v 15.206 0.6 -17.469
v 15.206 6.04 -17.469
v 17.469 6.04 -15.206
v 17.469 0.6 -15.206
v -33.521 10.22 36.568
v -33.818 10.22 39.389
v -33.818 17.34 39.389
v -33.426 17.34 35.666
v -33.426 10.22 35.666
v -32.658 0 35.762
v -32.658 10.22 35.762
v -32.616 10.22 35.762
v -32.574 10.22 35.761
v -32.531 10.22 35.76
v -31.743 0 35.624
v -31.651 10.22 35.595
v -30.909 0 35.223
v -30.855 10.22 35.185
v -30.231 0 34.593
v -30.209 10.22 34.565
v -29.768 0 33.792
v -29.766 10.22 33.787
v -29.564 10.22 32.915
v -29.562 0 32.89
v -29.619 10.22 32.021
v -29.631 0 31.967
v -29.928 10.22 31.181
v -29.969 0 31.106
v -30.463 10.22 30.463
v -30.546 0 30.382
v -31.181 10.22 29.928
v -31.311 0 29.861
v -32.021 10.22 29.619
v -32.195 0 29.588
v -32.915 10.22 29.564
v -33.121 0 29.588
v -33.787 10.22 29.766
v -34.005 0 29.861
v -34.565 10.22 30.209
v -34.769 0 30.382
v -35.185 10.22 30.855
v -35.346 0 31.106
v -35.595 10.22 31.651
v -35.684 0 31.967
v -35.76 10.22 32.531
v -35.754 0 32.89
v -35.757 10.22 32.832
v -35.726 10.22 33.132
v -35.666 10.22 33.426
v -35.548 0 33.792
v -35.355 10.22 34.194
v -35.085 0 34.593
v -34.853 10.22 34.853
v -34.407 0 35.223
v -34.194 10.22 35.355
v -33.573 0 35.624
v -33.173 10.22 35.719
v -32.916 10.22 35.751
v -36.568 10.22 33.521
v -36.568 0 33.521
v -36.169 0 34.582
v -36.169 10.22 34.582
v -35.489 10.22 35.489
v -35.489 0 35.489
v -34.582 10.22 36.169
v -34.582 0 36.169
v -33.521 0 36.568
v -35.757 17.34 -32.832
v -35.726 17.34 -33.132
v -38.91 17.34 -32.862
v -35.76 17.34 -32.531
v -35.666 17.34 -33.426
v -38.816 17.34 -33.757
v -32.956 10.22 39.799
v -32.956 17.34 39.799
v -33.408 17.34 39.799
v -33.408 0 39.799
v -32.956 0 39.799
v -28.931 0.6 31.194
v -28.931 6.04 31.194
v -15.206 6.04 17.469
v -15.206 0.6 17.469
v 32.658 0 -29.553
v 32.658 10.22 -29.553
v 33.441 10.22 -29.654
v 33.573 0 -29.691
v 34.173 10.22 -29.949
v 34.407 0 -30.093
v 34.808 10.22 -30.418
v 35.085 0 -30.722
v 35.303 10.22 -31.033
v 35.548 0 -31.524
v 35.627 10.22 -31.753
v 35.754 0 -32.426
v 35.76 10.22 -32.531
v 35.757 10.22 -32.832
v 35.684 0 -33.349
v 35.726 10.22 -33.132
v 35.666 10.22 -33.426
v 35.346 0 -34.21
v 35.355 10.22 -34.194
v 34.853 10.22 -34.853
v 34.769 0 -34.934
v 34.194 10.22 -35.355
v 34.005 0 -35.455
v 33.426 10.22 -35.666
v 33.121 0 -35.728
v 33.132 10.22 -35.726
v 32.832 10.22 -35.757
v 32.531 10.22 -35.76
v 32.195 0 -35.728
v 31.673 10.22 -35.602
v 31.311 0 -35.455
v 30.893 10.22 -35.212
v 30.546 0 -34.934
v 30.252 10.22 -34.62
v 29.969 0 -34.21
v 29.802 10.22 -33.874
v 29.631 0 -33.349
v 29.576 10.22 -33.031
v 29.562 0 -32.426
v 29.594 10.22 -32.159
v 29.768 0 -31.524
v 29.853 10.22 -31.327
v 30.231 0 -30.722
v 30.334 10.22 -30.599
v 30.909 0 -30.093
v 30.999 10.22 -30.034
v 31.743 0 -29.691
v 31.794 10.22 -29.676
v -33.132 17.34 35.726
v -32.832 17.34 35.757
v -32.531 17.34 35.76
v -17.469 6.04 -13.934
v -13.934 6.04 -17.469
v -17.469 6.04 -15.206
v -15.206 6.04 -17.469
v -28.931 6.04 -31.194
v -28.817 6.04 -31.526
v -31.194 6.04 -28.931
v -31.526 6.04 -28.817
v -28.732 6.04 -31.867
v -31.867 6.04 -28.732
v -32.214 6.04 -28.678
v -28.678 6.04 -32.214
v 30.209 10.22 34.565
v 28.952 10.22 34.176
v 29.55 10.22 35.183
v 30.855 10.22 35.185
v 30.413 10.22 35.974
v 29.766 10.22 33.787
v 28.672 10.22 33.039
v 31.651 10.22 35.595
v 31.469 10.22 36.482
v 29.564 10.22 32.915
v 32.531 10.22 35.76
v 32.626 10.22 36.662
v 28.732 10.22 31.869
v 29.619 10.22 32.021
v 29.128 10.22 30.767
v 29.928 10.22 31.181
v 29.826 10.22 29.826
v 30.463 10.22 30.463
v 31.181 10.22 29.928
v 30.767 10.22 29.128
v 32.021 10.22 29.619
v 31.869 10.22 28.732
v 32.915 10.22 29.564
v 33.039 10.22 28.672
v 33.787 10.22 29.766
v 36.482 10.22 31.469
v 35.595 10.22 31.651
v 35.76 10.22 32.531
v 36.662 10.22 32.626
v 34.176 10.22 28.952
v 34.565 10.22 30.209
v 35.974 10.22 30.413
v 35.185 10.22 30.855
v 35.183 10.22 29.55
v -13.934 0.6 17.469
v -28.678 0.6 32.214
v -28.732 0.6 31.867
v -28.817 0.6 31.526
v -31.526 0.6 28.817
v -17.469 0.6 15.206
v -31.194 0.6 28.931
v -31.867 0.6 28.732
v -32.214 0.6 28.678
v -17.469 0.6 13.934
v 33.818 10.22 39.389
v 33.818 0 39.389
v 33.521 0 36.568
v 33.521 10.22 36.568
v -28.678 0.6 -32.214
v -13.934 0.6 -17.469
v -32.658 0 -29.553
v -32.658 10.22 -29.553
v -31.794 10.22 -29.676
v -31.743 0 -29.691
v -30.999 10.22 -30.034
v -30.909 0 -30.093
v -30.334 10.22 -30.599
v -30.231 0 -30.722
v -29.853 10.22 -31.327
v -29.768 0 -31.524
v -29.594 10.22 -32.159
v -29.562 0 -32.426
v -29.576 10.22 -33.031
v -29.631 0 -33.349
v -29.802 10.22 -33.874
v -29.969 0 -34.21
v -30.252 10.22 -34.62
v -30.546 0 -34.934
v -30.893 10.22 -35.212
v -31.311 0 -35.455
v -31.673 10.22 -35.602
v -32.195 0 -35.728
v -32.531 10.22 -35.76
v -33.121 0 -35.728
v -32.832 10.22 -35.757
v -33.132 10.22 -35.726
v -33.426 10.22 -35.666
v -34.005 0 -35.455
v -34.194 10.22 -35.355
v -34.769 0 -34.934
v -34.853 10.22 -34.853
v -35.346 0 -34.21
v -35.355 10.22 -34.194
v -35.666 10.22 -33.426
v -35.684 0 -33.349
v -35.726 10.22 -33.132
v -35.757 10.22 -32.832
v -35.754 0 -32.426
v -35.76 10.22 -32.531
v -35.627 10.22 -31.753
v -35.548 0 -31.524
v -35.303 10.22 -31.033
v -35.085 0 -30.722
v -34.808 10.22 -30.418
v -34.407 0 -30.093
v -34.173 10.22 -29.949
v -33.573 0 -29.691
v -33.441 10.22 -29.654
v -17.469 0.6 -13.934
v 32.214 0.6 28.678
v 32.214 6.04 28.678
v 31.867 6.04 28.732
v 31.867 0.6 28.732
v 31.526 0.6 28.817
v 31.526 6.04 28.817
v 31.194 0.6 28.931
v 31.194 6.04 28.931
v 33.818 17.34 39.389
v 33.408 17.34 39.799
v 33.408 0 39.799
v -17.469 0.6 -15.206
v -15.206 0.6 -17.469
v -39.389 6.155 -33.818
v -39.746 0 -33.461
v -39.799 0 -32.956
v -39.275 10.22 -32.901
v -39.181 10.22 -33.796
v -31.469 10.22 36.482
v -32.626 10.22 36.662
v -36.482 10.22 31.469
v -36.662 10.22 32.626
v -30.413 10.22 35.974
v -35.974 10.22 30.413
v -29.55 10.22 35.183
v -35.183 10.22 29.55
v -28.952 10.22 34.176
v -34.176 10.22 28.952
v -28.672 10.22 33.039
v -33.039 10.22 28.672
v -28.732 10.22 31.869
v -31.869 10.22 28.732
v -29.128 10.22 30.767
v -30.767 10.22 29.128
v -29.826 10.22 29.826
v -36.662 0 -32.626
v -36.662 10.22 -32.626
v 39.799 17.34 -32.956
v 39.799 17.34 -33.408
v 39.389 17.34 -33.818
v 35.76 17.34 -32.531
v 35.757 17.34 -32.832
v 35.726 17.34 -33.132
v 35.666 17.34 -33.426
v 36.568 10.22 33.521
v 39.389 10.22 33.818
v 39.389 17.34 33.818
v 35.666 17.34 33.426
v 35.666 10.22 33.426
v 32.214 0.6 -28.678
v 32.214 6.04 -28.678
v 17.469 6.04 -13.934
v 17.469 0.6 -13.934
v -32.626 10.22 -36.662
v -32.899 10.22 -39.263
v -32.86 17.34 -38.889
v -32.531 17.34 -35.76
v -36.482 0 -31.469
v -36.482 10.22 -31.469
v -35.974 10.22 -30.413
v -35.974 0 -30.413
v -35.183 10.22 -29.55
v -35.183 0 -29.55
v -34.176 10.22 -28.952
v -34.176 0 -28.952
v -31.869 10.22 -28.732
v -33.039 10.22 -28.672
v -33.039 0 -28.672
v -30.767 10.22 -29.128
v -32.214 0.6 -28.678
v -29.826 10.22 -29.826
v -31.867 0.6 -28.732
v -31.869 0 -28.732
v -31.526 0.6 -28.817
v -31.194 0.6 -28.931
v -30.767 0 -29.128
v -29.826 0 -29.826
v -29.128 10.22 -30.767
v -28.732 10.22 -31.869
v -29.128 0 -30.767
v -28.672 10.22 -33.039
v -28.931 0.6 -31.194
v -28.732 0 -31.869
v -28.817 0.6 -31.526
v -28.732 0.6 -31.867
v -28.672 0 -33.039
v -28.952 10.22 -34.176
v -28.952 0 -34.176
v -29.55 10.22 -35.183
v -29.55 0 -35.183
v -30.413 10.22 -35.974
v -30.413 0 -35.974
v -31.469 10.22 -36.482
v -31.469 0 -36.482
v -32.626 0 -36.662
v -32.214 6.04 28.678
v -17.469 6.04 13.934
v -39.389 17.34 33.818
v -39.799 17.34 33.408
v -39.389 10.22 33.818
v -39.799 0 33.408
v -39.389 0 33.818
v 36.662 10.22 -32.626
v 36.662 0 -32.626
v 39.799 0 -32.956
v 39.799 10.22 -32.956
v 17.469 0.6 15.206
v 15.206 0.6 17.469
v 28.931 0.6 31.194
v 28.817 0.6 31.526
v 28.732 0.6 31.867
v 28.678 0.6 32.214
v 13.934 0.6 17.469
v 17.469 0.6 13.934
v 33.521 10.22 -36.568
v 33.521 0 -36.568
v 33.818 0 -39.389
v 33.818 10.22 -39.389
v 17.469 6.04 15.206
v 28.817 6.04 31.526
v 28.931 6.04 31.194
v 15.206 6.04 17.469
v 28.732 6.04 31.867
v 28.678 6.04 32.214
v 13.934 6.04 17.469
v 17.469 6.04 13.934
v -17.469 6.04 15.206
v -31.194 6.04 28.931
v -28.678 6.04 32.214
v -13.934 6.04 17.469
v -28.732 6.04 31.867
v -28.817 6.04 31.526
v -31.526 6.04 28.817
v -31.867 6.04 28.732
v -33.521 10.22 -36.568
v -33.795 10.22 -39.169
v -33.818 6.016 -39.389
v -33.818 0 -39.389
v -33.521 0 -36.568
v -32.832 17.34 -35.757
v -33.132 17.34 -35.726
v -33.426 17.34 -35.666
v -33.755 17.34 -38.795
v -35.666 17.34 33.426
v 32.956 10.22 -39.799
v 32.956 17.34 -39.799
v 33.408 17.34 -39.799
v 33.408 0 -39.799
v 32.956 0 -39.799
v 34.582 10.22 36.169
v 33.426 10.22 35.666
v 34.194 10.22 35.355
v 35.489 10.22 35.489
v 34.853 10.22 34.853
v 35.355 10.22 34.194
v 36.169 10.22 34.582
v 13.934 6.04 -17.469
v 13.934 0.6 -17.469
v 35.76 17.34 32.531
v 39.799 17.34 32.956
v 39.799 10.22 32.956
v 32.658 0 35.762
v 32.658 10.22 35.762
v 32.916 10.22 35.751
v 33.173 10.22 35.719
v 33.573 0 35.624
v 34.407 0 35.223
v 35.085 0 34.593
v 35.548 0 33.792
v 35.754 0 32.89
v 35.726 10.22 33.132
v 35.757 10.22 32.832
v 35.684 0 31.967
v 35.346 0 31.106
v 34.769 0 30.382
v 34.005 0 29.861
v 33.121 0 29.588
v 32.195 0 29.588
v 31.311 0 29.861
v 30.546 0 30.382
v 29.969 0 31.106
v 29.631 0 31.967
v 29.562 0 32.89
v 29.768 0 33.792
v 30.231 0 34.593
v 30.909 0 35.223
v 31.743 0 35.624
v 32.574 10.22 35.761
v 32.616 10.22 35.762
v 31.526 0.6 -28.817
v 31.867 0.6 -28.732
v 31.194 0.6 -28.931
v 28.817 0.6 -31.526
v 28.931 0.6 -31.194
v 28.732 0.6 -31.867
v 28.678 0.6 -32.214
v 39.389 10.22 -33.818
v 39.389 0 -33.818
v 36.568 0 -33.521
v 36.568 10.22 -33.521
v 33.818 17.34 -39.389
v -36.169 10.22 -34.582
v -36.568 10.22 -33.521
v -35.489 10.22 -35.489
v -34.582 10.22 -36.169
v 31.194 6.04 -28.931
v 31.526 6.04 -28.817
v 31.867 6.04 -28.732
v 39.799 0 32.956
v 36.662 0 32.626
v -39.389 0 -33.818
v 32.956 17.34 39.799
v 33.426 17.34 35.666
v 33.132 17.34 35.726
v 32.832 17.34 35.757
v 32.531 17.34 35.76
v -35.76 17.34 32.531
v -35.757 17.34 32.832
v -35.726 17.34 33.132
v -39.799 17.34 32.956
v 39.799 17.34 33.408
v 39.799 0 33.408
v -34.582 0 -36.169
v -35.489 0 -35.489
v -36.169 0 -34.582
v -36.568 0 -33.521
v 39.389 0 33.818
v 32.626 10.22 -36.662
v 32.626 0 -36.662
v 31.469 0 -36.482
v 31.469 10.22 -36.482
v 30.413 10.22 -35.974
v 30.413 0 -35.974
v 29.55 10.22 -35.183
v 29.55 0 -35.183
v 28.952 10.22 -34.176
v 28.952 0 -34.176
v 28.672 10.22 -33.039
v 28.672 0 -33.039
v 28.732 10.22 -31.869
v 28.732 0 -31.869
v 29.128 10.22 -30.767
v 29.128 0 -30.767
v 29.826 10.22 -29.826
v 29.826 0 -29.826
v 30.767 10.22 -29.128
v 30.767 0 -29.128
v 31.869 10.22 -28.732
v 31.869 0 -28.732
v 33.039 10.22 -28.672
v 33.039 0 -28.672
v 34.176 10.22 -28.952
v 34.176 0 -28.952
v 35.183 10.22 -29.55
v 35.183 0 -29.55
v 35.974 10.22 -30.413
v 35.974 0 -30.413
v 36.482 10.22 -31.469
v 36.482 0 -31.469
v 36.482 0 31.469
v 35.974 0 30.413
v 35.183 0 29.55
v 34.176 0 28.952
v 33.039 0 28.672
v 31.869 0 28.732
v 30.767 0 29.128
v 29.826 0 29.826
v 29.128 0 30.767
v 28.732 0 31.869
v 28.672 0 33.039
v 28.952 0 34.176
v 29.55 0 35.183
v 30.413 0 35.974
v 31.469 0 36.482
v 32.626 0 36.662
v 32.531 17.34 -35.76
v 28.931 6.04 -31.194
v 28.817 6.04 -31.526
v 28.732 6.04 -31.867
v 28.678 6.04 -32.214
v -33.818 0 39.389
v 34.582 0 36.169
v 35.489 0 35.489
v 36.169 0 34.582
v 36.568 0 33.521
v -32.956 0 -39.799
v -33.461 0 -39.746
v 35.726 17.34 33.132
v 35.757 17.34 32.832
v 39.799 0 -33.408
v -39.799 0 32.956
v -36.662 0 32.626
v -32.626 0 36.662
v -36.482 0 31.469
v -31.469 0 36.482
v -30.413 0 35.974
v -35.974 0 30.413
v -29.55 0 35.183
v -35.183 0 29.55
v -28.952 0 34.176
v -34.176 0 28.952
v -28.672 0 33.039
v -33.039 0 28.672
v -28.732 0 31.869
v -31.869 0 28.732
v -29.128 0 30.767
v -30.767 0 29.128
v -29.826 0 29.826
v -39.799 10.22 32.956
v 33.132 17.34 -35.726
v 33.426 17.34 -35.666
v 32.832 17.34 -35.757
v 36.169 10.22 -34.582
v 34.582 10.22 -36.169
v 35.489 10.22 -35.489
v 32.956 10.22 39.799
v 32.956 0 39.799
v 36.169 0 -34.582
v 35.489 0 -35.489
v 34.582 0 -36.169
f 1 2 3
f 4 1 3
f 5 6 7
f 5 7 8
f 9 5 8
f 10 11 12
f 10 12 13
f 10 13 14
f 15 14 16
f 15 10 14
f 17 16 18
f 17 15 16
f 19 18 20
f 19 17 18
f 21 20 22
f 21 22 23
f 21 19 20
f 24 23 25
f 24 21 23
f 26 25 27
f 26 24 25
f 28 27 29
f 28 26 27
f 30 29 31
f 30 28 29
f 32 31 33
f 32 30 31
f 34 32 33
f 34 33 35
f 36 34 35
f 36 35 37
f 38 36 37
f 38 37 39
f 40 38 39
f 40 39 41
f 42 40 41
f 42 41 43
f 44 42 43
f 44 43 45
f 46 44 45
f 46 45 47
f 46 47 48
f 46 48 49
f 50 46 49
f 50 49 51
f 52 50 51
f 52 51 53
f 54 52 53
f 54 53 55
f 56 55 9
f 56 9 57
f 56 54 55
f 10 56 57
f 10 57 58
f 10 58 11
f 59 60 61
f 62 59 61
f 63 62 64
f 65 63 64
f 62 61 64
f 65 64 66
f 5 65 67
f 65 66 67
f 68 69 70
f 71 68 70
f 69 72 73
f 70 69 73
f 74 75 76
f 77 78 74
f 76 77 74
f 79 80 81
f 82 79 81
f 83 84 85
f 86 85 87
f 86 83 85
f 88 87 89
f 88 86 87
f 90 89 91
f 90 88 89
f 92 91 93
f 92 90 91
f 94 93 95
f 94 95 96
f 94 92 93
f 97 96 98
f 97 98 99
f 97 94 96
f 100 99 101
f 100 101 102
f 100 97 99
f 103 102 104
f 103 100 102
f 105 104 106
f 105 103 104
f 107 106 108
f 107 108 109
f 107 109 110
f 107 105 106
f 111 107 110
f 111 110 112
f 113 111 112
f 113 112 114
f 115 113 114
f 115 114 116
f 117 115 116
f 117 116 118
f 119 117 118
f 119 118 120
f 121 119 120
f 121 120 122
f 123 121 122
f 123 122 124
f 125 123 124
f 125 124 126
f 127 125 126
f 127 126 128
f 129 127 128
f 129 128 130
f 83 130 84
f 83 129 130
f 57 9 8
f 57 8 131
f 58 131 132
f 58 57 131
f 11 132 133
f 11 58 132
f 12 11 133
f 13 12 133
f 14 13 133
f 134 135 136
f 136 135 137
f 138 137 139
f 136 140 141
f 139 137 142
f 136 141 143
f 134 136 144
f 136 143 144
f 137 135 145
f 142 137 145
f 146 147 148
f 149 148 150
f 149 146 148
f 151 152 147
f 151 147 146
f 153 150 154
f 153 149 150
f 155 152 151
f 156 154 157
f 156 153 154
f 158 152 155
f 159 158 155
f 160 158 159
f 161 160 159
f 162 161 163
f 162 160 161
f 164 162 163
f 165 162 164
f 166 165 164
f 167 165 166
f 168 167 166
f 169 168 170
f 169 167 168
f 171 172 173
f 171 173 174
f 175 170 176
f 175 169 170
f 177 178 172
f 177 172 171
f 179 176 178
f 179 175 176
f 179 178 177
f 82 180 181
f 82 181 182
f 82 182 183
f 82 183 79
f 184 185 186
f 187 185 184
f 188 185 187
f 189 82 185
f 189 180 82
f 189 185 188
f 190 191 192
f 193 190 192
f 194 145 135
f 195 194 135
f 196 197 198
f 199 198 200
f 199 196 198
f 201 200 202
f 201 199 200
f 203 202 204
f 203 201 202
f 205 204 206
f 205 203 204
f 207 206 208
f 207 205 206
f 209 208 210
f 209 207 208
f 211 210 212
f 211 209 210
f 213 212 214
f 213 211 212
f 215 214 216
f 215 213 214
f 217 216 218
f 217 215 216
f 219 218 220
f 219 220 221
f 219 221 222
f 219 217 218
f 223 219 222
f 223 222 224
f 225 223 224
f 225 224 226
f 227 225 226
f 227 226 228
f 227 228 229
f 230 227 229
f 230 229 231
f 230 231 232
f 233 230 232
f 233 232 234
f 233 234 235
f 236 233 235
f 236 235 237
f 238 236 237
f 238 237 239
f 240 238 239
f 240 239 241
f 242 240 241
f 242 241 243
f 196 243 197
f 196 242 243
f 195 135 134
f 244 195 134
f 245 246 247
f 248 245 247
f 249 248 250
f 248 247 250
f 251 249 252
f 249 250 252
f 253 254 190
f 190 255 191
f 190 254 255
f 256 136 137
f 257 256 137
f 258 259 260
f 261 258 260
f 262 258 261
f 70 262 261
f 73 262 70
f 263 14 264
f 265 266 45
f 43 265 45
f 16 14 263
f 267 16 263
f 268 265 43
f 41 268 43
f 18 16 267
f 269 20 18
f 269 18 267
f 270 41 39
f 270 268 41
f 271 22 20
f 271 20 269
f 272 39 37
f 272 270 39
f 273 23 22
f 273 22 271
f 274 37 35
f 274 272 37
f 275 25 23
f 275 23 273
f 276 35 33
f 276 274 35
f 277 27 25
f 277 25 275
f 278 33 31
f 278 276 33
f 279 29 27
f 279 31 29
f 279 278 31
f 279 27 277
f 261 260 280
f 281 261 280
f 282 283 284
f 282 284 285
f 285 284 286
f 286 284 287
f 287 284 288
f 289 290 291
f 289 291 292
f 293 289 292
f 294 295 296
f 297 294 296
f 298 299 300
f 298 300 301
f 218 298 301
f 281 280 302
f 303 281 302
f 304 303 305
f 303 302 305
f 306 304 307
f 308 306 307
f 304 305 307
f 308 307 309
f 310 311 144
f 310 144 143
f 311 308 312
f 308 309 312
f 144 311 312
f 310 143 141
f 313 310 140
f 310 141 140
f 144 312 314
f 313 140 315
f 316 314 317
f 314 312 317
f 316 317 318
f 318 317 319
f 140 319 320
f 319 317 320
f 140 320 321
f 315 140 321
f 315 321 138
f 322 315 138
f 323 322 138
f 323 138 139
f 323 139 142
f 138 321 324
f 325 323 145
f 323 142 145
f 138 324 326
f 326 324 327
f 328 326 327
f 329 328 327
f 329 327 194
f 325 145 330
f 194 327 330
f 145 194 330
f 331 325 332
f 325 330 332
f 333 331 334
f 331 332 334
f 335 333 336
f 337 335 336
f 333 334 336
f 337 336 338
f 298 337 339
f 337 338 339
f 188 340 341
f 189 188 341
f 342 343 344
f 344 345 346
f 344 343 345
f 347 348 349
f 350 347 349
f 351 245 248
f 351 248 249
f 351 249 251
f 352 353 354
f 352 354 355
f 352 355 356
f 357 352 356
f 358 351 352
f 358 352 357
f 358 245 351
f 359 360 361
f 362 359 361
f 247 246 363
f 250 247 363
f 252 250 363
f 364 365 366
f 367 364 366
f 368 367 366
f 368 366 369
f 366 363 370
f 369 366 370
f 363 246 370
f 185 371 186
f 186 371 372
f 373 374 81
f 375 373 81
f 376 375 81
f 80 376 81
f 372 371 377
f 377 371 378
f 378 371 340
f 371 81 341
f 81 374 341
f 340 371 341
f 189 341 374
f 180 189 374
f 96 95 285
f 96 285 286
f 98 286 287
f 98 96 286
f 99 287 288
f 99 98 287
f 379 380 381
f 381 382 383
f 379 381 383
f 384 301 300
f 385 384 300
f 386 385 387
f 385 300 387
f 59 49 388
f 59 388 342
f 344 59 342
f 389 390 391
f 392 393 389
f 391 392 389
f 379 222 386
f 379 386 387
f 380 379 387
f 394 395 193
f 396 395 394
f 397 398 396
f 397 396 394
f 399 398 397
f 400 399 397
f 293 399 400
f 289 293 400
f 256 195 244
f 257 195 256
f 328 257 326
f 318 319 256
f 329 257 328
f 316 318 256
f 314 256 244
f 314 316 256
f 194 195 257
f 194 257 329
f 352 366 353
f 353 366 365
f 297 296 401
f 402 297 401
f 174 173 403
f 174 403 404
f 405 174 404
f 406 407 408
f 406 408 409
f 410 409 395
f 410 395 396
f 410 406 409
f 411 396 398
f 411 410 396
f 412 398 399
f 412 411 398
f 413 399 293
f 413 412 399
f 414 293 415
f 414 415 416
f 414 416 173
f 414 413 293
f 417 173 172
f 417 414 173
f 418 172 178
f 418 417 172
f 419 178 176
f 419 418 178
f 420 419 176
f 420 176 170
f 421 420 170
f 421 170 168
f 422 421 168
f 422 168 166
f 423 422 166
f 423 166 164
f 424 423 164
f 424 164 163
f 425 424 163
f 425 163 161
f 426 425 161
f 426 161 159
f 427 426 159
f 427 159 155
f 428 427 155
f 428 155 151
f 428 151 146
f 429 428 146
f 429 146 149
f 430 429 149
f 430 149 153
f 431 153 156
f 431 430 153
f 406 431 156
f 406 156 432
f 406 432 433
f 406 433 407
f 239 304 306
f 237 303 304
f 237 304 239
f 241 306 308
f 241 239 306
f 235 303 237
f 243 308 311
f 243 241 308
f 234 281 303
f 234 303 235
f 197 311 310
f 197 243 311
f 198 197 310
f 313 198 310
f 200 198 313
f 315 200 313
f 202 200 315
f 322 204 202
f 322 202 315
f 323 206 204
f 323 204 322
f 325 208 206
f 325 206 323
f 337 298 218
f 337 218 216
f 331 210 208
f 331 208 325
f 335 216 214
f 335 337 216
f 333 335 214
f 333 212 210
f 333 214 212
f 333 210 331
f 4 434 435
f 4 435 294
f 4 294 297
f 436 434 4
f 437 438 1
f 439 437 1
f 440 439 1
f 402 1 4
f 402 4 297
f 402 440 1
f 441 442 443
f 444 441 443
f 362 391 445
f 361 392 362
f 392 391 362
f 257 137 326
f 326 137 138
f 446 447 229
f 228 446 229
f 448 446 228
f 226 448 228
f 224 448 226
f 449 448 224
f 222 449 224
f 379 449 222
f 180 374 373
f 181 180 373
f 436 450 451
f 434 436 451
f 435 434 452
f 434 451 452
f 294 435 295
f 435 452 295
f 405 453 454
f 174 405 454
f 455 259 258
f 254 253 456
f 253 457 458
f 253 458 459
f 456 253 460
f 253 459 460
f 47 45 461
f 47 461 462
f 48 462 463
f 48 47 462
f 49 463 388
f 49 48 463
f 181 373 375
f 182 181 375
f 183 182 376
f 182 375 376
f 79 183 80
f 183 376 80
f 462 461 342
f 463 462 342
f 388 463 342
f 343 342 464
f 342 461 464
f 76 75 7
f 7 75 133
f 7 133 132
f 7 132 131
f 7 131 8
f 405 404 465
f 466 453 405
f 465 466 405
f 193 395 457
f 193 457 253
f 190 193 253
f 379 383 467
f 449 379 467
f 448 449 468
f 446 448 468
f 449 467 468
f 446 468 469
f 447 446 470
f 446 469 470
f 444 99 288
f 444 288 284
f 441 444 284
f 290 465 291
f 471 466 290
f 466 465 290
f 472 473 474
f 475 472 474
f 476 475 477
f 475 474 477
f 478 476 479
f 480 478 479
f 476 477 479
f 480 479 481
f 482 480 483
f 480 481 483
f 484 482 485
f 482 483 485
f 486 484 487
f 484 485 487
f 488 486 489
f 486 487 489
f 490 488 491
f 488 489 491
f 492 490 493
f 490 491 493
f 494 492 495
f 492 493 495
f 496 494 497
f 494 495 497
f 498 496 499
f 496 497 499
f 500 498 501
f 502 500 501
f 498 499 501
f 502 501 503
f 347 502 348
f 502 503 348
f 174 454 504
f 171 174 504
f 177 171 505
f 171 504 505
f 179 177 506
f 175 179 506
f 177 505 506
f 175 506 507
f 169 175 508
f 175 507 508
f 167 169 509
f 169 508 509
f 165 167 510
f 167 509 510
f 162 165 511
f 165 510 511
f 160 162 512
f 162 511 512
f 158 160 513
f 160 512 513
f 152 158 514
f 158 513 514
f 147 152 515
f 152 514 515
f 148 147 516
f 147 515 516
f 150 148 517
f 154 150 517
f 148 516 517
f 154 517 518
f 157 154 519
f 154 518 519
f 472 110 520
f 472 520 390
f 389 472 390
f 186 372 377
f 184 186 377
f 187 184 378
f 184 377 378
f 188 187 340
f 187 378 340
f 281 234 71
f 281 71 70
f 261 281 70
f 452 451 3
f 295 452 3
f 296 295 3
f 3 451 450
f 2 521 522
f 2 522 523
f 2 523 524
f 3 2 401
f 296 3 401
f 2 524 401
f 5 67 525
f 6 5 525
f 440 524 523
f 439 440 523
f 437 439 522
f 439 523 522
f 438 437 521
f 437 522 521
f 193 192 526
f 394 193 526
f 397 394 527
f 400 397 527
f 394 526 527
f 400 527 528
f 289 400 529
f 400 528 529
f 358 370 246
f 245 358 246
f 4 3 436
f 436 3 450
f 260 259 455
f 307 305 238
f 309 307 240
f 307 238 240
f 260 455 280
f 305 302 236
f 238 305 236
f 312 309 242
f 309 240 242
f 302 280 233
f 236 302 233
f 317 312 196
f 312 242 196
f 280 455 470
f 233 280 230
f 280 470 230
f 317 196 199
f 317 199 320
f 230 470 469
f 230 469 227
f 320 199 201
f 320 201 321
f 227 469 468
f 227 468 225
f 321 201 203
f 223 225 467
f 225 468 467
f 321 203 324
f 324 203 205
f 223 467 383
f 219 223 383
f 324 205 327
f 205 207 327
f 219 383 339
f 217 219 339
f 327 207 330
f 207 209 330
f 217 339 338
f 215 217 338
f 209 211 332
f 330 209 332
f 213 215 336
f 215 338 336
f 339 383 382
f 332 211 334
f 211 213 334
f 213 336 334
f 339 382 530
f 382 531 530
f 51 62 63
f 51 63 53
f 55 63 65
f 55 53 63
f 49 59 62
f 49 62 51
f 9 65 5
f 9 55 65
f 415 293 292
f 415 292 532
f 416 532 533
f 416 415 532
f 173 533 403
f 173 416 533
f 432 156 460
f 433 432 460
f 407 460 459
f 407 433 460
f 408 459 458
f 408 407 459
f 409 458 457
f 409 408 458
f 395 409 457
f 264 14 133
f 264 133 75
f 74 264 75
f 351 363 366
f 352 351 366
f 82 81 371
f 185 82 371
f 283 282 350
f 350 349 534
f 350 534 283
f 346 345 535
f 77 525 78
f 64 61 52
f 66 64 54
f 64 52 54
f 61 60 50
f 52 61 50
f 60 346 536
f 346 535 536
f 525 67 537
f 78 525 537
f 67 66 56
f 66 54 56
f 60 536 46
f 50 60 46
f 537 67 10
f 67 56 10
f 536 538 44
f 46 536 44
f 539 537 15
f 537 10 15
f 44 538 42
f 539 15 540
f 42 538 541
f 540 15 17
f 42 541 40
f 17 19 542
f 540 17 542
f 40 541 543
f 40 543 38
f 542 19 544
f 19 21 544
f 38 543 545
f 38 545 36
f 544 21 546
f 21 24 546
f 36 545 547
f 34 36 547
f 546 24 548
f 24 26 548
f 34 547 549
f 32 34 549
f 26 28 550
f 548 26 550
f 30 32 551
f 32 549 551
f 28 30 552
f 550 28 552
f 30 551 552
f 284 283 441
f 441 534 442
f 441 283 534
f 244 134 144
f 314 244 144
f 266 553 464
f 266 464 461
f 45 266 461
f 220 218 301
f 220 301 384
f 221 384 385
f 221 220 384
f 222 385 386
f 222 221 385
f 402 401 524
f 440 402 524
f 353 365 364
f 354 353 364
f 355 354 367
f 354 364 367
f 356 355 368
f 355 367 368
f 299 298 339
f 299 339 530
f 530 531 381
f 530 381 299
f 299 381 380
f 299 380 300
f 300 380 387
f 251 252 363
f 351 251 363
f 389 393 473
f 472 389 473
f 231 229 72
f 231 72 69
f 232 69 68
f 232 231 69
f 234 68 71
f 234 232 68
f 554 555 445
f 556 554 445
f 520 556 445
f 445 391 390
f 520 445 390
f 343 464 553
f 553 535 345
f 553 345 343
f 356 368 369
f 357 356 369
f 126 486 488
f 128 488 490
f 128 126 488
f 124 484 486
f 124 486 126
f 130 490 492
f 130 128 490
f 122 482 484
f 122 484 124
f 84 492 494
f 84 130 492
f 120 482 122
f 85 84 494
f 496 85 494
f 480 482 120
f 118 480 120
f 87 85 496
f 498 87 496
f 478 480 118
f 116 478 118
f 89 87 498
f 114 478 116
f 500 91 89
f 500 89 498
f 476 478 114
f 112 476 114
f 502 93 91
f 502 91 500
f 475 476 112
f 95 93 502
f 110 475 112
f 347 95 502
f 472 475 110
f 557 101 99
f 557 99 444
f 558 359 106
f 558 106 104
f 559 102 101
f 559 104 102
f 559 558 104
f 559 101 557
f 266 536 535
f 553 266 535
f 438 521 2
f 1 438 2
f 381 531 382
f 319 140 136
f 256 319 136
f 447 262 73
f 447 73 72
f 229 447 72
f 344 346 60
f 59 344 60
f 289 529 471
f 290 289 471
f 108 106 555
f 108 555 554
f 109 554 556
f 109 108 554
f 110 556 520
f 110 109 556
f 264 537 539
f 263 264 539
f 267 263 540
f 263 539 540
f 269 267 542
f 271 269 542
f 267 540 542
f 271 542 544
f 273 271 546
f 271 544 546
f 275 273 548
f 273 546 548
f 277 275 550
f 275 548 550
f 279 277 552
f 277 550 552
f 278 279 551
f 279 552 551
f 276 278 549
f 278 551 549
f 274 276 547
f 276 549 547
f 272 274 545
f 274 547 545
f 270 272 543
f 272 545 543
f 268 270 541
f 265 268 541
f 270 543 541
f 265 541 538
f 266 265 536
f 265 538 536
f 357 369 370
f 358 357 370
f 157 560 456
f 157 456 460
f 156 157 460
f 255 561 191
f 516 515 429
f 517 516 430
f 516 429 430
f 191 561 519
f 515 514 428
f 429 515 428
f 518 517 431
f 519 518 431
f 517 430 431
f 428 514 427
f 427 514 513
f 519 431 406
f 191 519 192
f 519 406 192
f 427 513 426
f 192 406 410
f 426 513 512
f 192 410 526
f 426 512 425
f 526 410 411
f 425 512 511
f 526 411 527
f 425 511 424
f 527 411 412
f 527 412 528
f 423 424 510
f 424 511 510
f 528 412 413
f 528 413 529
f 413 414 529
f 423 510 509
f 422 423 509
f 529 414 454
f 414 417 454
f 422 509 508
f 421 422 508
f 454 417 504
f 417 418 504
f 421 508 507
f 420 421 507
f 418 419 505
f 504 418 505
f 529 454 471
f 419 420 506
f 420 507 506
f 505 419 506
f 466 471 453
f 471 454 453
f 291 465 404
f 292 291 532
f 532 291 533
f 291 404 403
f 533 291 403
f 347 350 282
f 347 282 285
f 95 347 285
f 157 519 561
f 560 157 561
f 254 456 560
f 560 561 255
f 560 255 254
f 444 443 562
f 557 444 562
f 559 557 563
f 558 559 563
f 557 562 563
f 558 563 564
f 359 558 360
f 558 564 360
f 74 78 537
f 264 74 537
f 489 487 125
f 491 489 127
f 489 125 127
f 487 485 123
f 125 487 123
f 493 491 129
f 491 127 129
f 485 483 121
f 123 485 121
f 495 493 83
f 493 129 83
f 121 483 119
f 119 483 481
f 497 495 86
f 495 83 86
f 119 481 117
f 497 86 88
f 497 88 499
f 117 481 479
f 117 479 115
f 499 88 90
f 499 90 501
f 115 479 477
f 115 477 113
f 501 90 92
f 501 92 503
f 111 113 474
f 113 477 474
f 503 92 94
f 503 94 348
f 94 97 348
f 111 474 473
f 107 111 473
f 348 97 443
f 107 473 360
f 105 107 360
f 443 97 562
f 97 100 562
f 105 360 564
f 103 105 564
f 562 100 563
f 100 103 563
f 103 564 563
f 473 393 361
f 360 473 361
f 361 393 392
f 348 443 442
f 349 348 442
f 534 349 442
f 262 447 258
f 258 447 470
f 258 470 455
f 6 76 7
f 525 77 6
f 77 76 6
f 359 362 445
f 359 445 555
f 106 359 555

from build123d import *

# Parameters (mm, degrees)
SKETCH2_R               = 3.104394748
BOSS_EXTRUDE1_DEPTH     = 10.22
BOSS_EXTRUDE1_2_DEPTH   = 10.22
BOSS_EXTRUDE1_3_DEPTH   = 10.22
BOSS_EXTRUDE1_4_DEPTH   = 10.22
BOSS_EXTRUDE2_DEPTH     = 7.12
BOSS_EXTRUDE3_START     = -5.44
BOSS_EXTRUDE3_DEPTH     = 5.44
BOSS_EXTRUDE3_2_DEPTH   = 5.44
BOSS_EXTRUDE3_3_DEPTH   = 5.44
BOSS_EXTRUDE3_4_DEPTH   = 5.44
CUT_EXTRUDE2_DEPTH      = 83.406657099
CUT_EXTRUDE2_DEPTH_BACK = 83.406657099
CUT_EXTRUDE3_DEPTH      = 83.406657099
CUT_EXTRUDE3_DEPTH_BACK = 83.406657099


# Read off the part's stored shape, not the designer's step: Boss-Extrude3
with BuildPart() as part:
    # Sketch2 → Boss-Extrude1 (new body)
    with BuildSketch(Plane(origin=(0, 0, 0), x_dir=(1, 0, 0), z_dir=(0, 1, 0))):
        with BuildLine():
            Line((-36.56808357, 33.521240003), (-39.389348261, 33.81770357))
            Line((-39.389348261, 33.81770357), (-39.798800006, 33.408251825))
            Line((-39.798800006, 33.408251825), (-39.799120802, 32.955807865))
            Line((-39.799120802, 32.955807865), (-36.662139324, 32.62616821))
            ThreePointArc((-36.662139324, 32.62616821), (-29.826335384, 29.826335384), (-32.62616821, 36.662139324))
            Line((-32.62616821, 36.662139324), (-32.955807865, 39.799120802))
            Line((-32.955807865, 39.799120802), (-33.408251825, 39.798800006))
            Line((-33.408251825, 39.798800006), (-33.81770357, 39.389348261))
            Line((-33.81770357, 39.389348261), (-33.521240003, 36.56808357))
            ThreePointArc((-33.521240003, 36.56808357), (-35.489404747, 35.489404747), (-36.56808357, 33.521240003))
        make_face()
        with Locations(Location((-32.657870065, 32.657870065, 0), (0, 0, 270))):
            Circle(SKETCH2_R, mode=Mode.SUBTRACT)
    extrude(amount=BOSS_EXTRUDE1_DEPTH)



with BuildPart() as body_2:
    # Sketch2 → Boss-Extrude1 2 (new body)
    with BuildSketch(Plane(origin=(0, 0, 0), x_dir=(1, 0, 0), z_dir=(0, 1, 0))):
        with BuildLine():
            Line((33.521240003, 36.56808357), (33.81770357, 39.389348261))
            Line((33.81770357, 39.389348261), (33.408251825, 39.798800006))
            Line((33.408251825, 39.798800006), (32.955807865, 39.799120802))
            Line((32.955807865, 39.799120802), (32.62616821, 36.662139324))
            ThreePointArc((32.62616821, 36.662139324), (29.826335384, 29.826335384), (36.662139324, 32.62616821))
            Line((36.662139324, 32.62616821), (39.799120802, 32.955807865))
            Line((39.799120802, 32.955807865), (39.798800006, 33.408251825))
            Line((39.798800006, 33.408251825), (39.389348261, 33.81770357))
            Line((39.389348261, 33.81770357), (36.56808357, 33.521240003))
            ThreePointArc((36.56808357, 33.521240003), (35.489404747, 35.489404747), (33.521240003, 36.56808357))
        make_face()
        with Locations(Location((32.657870065, 32.657870065, 0), (0, 0, 270))):
            Circle(SKETCH2_R, mode=Mode.SUBTRACT)
    extrude(amount=BOSS_EXTRUDE1_2_DEPTH)


with BuildPart() as body_3:
    # Sketch2 → Boss-Extrude1 3 (new body)
    with BuildSketch(Plane(origin=(0, 0, 0), x_dir=(1, 0, 0), z_dir=(0, 1, 0))):
        with BuildLine():
            Line((36.56808357, -33.521240003), (39.389348261, -33.81770357))
            Line((39.389348261, -33.81770357), (39.798800006, -33.408251825))
            Line((39.798800006, -33.408251825), (39.799120802, -32.955807865))
            Line((39.799120802, -32.955807865), (36.662139324, -32.62616821))
            ThreePointArc((36.662139324, -32.62616821), (29.826335384, -29.826335384), (32.62616821, -36.662139324))
            Line((32.62616821, -36.662139324), (32.955807865, -39.799120802))
            Line((32.955807865, -39.799120802), (33.408251825, -39.798800006))
            Line((33.408251825, -39.798800006), (33.81770357, -39.389348261))
            Line((33.81770357, -39.389348261), (33.521240003, -36.56808357))
            ThreePointArc((33.521240003, -36.56808357), (35.489404747, -35.489404747), (36.56808357, -33.521240003))
        make_face()
        with Locations(Location((32.657870065, -32.657870065, 0), (0, 0, 270))):
            Circle(SKETCH2_R, mode=Mode.SUBTRACT)
    extrude(amount=BOSS_EXTRUDE1_3_DEPTH)


with BuildPart() as body_4:
    # Sketch2 → Boss-Extrude1 4 (new body)
    with BuildSketch(Plane(origin=(0, 0, 0), x_dir=(1, 0, 0), z_dir=(0, 1, 0))):
        with BuildLine():
            Line((-33.521240003, -36.56808357), (-33.81770357, -39.389348261))
            Line((-33.81770357, -39.389348261), (-33.408251825, -39.798800006))
            Line((-33.408251825, -39.798800006), (-32.955807865, -39.799120802))
            Line((-32.955807865, -39.799120802), (-32.62616821, -36.662139324))
            ThreePointArc((-32.62616821, -36.662139324), (-29.826335384, -29.826335384), (-36.662139324, -32.62616821))
            Line((-36.662139324, -32.62616821), (-39.799120802, -32.955807865))
            Line((-39.799120802, -32.955807865), (-39.798800006, -33.408251825))
            Line((-39.798800006, -33.408251825), (-39.389348261, -33.81770357))
            Line((-39.389348261, -33.81770357), (-36.56808357, -33.521240003))
            ThreePointArc((-36.56808357, -33.521240003), (-35.489404747, -35.489404747), (-33.521240003, -36.56808357))
        make_face()
        with Locations(Location((-32.657870065, -32.657870065, 0), (0, 0, 270))):
            Circle(SKETCH2_R, mode=Mode.SUBTRACT)
    extrude(amount=BOSS_EXTRUDE1_4_DEPTH)


with BuildPart() as part_1:
    add(part.part)

    add(body_2.part)  # Boss-Extrude2 merges body 2

    add(body_3.part)  # Boss-Extrude2 merges body 3

    add(body_4.part)  # Boss-Extrude2 merges body 4
    # Sketch3 → Boss-Extrude2 (add)
    with BuildSketch(Plane(origin=(0, 10.22, 0), x_dir=(1, 0, 0), z_dir=(0, 1, 0))):
        with BuildLine():
            Line((-39.389348261, 33.81770357), (-35.665629274, 33.426408483))
            ThreePointArc((-35.665629274, 33.426408483), (-35.745265815, 32.982299163), (-35.759685027, 32.531336689))
            Line((-35.759685027, 32.531336689), (-39.799120802, 32.955807865))
            Line((-39.799120802, 32.955807865), (-39.798800006, 33.408251825))
            Line((-39.798800006, 33.408251825), (-39.389348261, 33.81770357))
        make_face()
        with BuildLine():
            Line((-32.955807865, 39.799120802), (-32.531336689, 35.759685027))
            ThreePointArc((-32.531336689, 35.759685027), (-32.982299163, 35.745265815), (-33.426408483, 35.665629274))
            Line((-33.426408483, 35.665629274), (-33.81770357, 39.389348261))
            Line((-33.81770357, 39.389348261), (-33.408251825, 39.798800006))
            Line((-33.408251825, 39.798800006), (-32.955807865, 39.799120802))
        make_face()
        with BuildLine():
            Line((33.81770357, 39.389348261), (33.426408483, 35.665629274))
            ThreePointArc((33.426408483, 35.665629274), (32.982299163, 35.745265815), (32.531336689, 35.759685027))
            Line((32.531336689, 35.759685027), (32.955807865, 39.799120802))
            Line((32.955807865, 39.799120802), (33.408251825, 39.798800006))
            Line((33.408251825, 39.798800006), (33.81770357, 39.389348261))
        make_face()
        with BuildLine():
            Line((39.799120802, 32.955807865), (35.759685027, 32.531336689))
            ThreePointArc((35.759685027, 32.531336689), (35.745265815, 32.982299163), (35.665629274, 33.426408483))
            Line((35.665629274, 33.426408483), (39.389348261, 33.81770357))
            Line((39.389348261, 33.81770357), (39.798800006, 33.408251825))
            Line((39.798800006, 33.408251825), (39.799120802, 32.955807865))
        make_face()
        with BuildLine():
            Line((39.389348261, -33.81770357), (35.665629274, -33.426408483))
            ThreePointArc((35.665629274, -33.426408483), (35.745265815, -32.982299163), (35.759685027, -32.531336689))
            Line((35.759685027, -32.531336689), (39.799120802, -32.955807865))
            Line((39.799120802, -32.955807865), (39.798800006, -33.408251825))
            Line((39.798800006, -33.408251825), (39.389348261, -33.81770357))
        make_face()
        with BuildLine():
            Line((32.955807865, -39.799120802), (32.531336689, -35.759685027))
            ThreePointArc((32.531336689, -35.759685027), (32.982299163, -35.745265815), (33.426408483, -35.665629274))
            Line((33.426408483, -35.665629274), (33.81770357, -39.389348261))
            Line((33.81770357, -39.389348261), (33.408251825, -39.798800006))
            Line((33.408251825, -39.798800006), (32.955807865, -39.799120802))
        make_face()
        with BuildLine():
            Line((-33.81770357, -39.389348261), (-33.426408483, -35.665629274))
            ThreePointArc((-33.426408483, -35.665629274), (-32.982299163, -35.745265815), (-32.531336689, -35.759685027))
            Line((-32.531336689, -35.759685027), (-32.955807865, -39.799120802))
            Line((-32.955807865, -39.799120802), (-33.408251825, -39.798800006))
            Line((-33.408251825, -39.798800006), (-33.81770357, -39.389348261))
        make_face()
        with BuildLine():
            Line((-39.799120802, -32.955807865), (-35.759685027, -32.531336689))
            ThreePointArc((-35.759685027, -32.531336689), (-35.745265815, -32.982299163), (-35.665629274, -33.426408483))
            Line((-35.665629274, -33.426408483), (-39.389348261, -33.81770357))
            Line((-39.389348261, -33.81770357), (-39.798800006, -33.408251825))
            Line((-39.798800006, -33.408251825), (-39.799120802, -32.955807865))
        make_face()
    extrude(amount=BOSS_EXTRUDE2_DEPTH)

    # Boss-Extrude3 4 outline → Boss-Extrude3 4 (add)
    with BuildSketch(Plane(origin=(0, 0.60000007, 0), x_dir=(-1, 0, 0), z_dir=(0, -1, 0)).offset(BOSS_EXTRUDE3_START)):
        with BuildLine():
            Line((17.46921643, 15.206474617), (15.206474617, 17.46921643))
            Line((15.206474617, 17.46921643), (28.930812636, 31.193554449))
            ThreePointArc((28.930812636, 31.193554449), (28.770884193, 31.695311947), (28.678183425, 32.213717445))
            Line((28.678183425, 32.213717445), (13.93368241, 17.46921643))
            Line((13.93368241, 17.46921643), (17.46921643, 13.93368241))
            Line((17.46921643, 13.93368241), (32.213717445, 28.678183425))
            ThreePointArc((32.213717445, 28.678183425), (31.695311947, 28.770884193), (31.193554449, 28.930812636))
            Line((31.193554449, 28.930812636), (17.46921643, 15.206474617))
        make_face()
    extrude(amount=BOSS_EXTRUDE3_4_DEPTH)

    # Sketch7 → Cut-Extrude2 (cut, two sides: drawn at the far end of the back side and taken through both)
    with BuildSketch(Plane(origin=(-28.459390838, 0, 2.990563969), x_dir=(-0.10450639299140999, 0, -0.9945242148001853), z_dir=(0.9945242148001854, 0, -0.10450639299140999)).offset(-CUT_EXTRUDE2_DEPTH_BACK)):
        Polygon((52.877921967, -186.703123885), (43.025281973, 0), (42.110220811, 17.34), (32.257580818, 204.043123885), (405.663828588, 223.748403873), (426.284169737, -166.997843898), align=None)
    extrude(amount=CUT_EXTRUDE2_DEPTH + CUT_EXTRUDE2_DEPTH_BACK, mode=Mode.SUBTRACT)

    # Sketch8 → Cut-Extrude3 (cut, two sides: drawn at the far end of the back side and taken through both)
    with BuildSketch(Plane(origin=(2.990563969, 0, -28.459390838), x_dir=(0.9945242148001855, 0, 0.10450639299140776), z_dir=(-0.10450639299140778, 0, 0.9945242148001856)).offset(-CUT_EXTRUDE3_DEPTH_BACK)):
        Polygon((-52.655564798, -186.714725279), (-43.025281973, 0), (-42.130927744, 17.34), (-32.50064492, 204.054725279), (-405.930095478, 223.315290927), (-426.085015356, -167.454159631), align=None)
    extrude(amount=CUT_EXTRUDE3_DEPTH + CUT_EXTRUDE3_DEPTH_BACK, mode=Mode.SUBTRACT)


with BuildPart() as body_2_2:
    # Boss-Extrude3 outline → Boss-Extrude3 (new body)
    with BuildSketch(Plane(origin=(0, 0.60000007, 0), x_dir=(-1, 0, 0), z_dir=(0, -1, 0)).offset(BOSS_EXTRUDE3_START)):
        with BuildLine():
            ThreePointArc((-31.193554449, 28.930812636), (-31.695311946, 28.770884193), (-32.213717445, 28.678183426))
            Line((-32.213717445, 28.678183426), (-17.46921643, 13.93368241))
            Line((-17.46921643, 13.93368241), (-13.93368241, 17.46921643))
            Line((-13.93368241, 17.46921643), (-28.678183426, 32.213717445))
            ThreePointArc((-28.678183426, 32.213717445), (-28.770884193, 31.695311946), (-28.930812636, 31.193554449))
            Line((-28.930812636, 31.193554449), (-15.206474617, 17.46921643))
            Line((-15.206474617, 17.46921643), (-17.46921643, 15.206474617))
            Line((-17.46921643, 15.206474617), (-31.193554449, 28.930812636))
        make_face()
    extrude(amount=BOSS_EXTRUDE3_DEPTH)


with BuildPart() as body_3_2:
    # Boss-Extrude3 2 outline → Boss-Extrude3 2 (new body)
    with BuildSketch(Plane(origin=(0, 0.60000007, 0), x_dir=(-1, 0, 0), z_dir=(0, -1, 0)).offset(BOSS_EXTRUDE3_START)):
        with BuildLine():
            ThreePointArc((-28.930812636, -31.193554449), (-28.770884193, -31.695311946), (-28.678183426, -32.213717445))
            Line((-28.678183426, -32.213717445), (-13.93368241, -17.46921643))
            Line((-13.93368241, -17.46921643), (-17.46921643, -13.93368241))
            Line((-17.46921643, -13.93368241), (-32.213717445, -28.678183426))
            ThreePointArc((-32.213717445, -28.678183426), (-31.695311946, -28.770884193), (-31.193554449, -28.930812636))
            Line((-31.193554449, -28.930812636), (-17.46921643, -15.206474617))
            Line((-17.46921643, -15.206474617), (-15.206474617, -17.46921643))
            Line((-15.206474617, -17.46921643), (-28.930812636, -31.193554449))
        make_face()
    extrude(amount=BOSS_EXTRUDE3_2_DEPTH)


with BuildPart() as body_4_2:
    # Boss-Extrude3 3 outline → Boss-Extrude3 3 (new body)
    with BuildSketch(Plane(origin=(0, 0.60000007, 0), x_dir=(-1, 0, 0), z_dir=(0, -1, 0)).offset(BOSS_EXTRUDE3_START)):
        with BuildLine():
            ThreePointArc((31.193554449, -28.930812636), (31.695311946, -28.770884193), (32.213717445, -28.678183426))
            Line((32.213717445, -28.678183426), (17.46921643, -13.93368241))
            Line((17.46921643, -13.93368241), (13.93368241, -17.46921643))
            Line((13.93368241, -17.46921643), (28.678183426, -32.213717445))
            ThreePointArc((28.678183426, -32.213717445), (28.770884193, -31.695311946), (28.930812636, -31.193554449))
            Line((28.930812636, -31.193554449), (15.206474617, -17.46921643))
            Line((15.206474617, -17.46921643), (17.46921643, -15.206474617))
            Line((17.46921643, -15.206474617), (31.193554449, -28.930812636))
        make_face()
    extrude(amount=BOSS_EXTRUDE3_3_DEPTH)


solid = Compound([part_1.part, body_2_2.part, body_3_2.part, body_4_2.part])
